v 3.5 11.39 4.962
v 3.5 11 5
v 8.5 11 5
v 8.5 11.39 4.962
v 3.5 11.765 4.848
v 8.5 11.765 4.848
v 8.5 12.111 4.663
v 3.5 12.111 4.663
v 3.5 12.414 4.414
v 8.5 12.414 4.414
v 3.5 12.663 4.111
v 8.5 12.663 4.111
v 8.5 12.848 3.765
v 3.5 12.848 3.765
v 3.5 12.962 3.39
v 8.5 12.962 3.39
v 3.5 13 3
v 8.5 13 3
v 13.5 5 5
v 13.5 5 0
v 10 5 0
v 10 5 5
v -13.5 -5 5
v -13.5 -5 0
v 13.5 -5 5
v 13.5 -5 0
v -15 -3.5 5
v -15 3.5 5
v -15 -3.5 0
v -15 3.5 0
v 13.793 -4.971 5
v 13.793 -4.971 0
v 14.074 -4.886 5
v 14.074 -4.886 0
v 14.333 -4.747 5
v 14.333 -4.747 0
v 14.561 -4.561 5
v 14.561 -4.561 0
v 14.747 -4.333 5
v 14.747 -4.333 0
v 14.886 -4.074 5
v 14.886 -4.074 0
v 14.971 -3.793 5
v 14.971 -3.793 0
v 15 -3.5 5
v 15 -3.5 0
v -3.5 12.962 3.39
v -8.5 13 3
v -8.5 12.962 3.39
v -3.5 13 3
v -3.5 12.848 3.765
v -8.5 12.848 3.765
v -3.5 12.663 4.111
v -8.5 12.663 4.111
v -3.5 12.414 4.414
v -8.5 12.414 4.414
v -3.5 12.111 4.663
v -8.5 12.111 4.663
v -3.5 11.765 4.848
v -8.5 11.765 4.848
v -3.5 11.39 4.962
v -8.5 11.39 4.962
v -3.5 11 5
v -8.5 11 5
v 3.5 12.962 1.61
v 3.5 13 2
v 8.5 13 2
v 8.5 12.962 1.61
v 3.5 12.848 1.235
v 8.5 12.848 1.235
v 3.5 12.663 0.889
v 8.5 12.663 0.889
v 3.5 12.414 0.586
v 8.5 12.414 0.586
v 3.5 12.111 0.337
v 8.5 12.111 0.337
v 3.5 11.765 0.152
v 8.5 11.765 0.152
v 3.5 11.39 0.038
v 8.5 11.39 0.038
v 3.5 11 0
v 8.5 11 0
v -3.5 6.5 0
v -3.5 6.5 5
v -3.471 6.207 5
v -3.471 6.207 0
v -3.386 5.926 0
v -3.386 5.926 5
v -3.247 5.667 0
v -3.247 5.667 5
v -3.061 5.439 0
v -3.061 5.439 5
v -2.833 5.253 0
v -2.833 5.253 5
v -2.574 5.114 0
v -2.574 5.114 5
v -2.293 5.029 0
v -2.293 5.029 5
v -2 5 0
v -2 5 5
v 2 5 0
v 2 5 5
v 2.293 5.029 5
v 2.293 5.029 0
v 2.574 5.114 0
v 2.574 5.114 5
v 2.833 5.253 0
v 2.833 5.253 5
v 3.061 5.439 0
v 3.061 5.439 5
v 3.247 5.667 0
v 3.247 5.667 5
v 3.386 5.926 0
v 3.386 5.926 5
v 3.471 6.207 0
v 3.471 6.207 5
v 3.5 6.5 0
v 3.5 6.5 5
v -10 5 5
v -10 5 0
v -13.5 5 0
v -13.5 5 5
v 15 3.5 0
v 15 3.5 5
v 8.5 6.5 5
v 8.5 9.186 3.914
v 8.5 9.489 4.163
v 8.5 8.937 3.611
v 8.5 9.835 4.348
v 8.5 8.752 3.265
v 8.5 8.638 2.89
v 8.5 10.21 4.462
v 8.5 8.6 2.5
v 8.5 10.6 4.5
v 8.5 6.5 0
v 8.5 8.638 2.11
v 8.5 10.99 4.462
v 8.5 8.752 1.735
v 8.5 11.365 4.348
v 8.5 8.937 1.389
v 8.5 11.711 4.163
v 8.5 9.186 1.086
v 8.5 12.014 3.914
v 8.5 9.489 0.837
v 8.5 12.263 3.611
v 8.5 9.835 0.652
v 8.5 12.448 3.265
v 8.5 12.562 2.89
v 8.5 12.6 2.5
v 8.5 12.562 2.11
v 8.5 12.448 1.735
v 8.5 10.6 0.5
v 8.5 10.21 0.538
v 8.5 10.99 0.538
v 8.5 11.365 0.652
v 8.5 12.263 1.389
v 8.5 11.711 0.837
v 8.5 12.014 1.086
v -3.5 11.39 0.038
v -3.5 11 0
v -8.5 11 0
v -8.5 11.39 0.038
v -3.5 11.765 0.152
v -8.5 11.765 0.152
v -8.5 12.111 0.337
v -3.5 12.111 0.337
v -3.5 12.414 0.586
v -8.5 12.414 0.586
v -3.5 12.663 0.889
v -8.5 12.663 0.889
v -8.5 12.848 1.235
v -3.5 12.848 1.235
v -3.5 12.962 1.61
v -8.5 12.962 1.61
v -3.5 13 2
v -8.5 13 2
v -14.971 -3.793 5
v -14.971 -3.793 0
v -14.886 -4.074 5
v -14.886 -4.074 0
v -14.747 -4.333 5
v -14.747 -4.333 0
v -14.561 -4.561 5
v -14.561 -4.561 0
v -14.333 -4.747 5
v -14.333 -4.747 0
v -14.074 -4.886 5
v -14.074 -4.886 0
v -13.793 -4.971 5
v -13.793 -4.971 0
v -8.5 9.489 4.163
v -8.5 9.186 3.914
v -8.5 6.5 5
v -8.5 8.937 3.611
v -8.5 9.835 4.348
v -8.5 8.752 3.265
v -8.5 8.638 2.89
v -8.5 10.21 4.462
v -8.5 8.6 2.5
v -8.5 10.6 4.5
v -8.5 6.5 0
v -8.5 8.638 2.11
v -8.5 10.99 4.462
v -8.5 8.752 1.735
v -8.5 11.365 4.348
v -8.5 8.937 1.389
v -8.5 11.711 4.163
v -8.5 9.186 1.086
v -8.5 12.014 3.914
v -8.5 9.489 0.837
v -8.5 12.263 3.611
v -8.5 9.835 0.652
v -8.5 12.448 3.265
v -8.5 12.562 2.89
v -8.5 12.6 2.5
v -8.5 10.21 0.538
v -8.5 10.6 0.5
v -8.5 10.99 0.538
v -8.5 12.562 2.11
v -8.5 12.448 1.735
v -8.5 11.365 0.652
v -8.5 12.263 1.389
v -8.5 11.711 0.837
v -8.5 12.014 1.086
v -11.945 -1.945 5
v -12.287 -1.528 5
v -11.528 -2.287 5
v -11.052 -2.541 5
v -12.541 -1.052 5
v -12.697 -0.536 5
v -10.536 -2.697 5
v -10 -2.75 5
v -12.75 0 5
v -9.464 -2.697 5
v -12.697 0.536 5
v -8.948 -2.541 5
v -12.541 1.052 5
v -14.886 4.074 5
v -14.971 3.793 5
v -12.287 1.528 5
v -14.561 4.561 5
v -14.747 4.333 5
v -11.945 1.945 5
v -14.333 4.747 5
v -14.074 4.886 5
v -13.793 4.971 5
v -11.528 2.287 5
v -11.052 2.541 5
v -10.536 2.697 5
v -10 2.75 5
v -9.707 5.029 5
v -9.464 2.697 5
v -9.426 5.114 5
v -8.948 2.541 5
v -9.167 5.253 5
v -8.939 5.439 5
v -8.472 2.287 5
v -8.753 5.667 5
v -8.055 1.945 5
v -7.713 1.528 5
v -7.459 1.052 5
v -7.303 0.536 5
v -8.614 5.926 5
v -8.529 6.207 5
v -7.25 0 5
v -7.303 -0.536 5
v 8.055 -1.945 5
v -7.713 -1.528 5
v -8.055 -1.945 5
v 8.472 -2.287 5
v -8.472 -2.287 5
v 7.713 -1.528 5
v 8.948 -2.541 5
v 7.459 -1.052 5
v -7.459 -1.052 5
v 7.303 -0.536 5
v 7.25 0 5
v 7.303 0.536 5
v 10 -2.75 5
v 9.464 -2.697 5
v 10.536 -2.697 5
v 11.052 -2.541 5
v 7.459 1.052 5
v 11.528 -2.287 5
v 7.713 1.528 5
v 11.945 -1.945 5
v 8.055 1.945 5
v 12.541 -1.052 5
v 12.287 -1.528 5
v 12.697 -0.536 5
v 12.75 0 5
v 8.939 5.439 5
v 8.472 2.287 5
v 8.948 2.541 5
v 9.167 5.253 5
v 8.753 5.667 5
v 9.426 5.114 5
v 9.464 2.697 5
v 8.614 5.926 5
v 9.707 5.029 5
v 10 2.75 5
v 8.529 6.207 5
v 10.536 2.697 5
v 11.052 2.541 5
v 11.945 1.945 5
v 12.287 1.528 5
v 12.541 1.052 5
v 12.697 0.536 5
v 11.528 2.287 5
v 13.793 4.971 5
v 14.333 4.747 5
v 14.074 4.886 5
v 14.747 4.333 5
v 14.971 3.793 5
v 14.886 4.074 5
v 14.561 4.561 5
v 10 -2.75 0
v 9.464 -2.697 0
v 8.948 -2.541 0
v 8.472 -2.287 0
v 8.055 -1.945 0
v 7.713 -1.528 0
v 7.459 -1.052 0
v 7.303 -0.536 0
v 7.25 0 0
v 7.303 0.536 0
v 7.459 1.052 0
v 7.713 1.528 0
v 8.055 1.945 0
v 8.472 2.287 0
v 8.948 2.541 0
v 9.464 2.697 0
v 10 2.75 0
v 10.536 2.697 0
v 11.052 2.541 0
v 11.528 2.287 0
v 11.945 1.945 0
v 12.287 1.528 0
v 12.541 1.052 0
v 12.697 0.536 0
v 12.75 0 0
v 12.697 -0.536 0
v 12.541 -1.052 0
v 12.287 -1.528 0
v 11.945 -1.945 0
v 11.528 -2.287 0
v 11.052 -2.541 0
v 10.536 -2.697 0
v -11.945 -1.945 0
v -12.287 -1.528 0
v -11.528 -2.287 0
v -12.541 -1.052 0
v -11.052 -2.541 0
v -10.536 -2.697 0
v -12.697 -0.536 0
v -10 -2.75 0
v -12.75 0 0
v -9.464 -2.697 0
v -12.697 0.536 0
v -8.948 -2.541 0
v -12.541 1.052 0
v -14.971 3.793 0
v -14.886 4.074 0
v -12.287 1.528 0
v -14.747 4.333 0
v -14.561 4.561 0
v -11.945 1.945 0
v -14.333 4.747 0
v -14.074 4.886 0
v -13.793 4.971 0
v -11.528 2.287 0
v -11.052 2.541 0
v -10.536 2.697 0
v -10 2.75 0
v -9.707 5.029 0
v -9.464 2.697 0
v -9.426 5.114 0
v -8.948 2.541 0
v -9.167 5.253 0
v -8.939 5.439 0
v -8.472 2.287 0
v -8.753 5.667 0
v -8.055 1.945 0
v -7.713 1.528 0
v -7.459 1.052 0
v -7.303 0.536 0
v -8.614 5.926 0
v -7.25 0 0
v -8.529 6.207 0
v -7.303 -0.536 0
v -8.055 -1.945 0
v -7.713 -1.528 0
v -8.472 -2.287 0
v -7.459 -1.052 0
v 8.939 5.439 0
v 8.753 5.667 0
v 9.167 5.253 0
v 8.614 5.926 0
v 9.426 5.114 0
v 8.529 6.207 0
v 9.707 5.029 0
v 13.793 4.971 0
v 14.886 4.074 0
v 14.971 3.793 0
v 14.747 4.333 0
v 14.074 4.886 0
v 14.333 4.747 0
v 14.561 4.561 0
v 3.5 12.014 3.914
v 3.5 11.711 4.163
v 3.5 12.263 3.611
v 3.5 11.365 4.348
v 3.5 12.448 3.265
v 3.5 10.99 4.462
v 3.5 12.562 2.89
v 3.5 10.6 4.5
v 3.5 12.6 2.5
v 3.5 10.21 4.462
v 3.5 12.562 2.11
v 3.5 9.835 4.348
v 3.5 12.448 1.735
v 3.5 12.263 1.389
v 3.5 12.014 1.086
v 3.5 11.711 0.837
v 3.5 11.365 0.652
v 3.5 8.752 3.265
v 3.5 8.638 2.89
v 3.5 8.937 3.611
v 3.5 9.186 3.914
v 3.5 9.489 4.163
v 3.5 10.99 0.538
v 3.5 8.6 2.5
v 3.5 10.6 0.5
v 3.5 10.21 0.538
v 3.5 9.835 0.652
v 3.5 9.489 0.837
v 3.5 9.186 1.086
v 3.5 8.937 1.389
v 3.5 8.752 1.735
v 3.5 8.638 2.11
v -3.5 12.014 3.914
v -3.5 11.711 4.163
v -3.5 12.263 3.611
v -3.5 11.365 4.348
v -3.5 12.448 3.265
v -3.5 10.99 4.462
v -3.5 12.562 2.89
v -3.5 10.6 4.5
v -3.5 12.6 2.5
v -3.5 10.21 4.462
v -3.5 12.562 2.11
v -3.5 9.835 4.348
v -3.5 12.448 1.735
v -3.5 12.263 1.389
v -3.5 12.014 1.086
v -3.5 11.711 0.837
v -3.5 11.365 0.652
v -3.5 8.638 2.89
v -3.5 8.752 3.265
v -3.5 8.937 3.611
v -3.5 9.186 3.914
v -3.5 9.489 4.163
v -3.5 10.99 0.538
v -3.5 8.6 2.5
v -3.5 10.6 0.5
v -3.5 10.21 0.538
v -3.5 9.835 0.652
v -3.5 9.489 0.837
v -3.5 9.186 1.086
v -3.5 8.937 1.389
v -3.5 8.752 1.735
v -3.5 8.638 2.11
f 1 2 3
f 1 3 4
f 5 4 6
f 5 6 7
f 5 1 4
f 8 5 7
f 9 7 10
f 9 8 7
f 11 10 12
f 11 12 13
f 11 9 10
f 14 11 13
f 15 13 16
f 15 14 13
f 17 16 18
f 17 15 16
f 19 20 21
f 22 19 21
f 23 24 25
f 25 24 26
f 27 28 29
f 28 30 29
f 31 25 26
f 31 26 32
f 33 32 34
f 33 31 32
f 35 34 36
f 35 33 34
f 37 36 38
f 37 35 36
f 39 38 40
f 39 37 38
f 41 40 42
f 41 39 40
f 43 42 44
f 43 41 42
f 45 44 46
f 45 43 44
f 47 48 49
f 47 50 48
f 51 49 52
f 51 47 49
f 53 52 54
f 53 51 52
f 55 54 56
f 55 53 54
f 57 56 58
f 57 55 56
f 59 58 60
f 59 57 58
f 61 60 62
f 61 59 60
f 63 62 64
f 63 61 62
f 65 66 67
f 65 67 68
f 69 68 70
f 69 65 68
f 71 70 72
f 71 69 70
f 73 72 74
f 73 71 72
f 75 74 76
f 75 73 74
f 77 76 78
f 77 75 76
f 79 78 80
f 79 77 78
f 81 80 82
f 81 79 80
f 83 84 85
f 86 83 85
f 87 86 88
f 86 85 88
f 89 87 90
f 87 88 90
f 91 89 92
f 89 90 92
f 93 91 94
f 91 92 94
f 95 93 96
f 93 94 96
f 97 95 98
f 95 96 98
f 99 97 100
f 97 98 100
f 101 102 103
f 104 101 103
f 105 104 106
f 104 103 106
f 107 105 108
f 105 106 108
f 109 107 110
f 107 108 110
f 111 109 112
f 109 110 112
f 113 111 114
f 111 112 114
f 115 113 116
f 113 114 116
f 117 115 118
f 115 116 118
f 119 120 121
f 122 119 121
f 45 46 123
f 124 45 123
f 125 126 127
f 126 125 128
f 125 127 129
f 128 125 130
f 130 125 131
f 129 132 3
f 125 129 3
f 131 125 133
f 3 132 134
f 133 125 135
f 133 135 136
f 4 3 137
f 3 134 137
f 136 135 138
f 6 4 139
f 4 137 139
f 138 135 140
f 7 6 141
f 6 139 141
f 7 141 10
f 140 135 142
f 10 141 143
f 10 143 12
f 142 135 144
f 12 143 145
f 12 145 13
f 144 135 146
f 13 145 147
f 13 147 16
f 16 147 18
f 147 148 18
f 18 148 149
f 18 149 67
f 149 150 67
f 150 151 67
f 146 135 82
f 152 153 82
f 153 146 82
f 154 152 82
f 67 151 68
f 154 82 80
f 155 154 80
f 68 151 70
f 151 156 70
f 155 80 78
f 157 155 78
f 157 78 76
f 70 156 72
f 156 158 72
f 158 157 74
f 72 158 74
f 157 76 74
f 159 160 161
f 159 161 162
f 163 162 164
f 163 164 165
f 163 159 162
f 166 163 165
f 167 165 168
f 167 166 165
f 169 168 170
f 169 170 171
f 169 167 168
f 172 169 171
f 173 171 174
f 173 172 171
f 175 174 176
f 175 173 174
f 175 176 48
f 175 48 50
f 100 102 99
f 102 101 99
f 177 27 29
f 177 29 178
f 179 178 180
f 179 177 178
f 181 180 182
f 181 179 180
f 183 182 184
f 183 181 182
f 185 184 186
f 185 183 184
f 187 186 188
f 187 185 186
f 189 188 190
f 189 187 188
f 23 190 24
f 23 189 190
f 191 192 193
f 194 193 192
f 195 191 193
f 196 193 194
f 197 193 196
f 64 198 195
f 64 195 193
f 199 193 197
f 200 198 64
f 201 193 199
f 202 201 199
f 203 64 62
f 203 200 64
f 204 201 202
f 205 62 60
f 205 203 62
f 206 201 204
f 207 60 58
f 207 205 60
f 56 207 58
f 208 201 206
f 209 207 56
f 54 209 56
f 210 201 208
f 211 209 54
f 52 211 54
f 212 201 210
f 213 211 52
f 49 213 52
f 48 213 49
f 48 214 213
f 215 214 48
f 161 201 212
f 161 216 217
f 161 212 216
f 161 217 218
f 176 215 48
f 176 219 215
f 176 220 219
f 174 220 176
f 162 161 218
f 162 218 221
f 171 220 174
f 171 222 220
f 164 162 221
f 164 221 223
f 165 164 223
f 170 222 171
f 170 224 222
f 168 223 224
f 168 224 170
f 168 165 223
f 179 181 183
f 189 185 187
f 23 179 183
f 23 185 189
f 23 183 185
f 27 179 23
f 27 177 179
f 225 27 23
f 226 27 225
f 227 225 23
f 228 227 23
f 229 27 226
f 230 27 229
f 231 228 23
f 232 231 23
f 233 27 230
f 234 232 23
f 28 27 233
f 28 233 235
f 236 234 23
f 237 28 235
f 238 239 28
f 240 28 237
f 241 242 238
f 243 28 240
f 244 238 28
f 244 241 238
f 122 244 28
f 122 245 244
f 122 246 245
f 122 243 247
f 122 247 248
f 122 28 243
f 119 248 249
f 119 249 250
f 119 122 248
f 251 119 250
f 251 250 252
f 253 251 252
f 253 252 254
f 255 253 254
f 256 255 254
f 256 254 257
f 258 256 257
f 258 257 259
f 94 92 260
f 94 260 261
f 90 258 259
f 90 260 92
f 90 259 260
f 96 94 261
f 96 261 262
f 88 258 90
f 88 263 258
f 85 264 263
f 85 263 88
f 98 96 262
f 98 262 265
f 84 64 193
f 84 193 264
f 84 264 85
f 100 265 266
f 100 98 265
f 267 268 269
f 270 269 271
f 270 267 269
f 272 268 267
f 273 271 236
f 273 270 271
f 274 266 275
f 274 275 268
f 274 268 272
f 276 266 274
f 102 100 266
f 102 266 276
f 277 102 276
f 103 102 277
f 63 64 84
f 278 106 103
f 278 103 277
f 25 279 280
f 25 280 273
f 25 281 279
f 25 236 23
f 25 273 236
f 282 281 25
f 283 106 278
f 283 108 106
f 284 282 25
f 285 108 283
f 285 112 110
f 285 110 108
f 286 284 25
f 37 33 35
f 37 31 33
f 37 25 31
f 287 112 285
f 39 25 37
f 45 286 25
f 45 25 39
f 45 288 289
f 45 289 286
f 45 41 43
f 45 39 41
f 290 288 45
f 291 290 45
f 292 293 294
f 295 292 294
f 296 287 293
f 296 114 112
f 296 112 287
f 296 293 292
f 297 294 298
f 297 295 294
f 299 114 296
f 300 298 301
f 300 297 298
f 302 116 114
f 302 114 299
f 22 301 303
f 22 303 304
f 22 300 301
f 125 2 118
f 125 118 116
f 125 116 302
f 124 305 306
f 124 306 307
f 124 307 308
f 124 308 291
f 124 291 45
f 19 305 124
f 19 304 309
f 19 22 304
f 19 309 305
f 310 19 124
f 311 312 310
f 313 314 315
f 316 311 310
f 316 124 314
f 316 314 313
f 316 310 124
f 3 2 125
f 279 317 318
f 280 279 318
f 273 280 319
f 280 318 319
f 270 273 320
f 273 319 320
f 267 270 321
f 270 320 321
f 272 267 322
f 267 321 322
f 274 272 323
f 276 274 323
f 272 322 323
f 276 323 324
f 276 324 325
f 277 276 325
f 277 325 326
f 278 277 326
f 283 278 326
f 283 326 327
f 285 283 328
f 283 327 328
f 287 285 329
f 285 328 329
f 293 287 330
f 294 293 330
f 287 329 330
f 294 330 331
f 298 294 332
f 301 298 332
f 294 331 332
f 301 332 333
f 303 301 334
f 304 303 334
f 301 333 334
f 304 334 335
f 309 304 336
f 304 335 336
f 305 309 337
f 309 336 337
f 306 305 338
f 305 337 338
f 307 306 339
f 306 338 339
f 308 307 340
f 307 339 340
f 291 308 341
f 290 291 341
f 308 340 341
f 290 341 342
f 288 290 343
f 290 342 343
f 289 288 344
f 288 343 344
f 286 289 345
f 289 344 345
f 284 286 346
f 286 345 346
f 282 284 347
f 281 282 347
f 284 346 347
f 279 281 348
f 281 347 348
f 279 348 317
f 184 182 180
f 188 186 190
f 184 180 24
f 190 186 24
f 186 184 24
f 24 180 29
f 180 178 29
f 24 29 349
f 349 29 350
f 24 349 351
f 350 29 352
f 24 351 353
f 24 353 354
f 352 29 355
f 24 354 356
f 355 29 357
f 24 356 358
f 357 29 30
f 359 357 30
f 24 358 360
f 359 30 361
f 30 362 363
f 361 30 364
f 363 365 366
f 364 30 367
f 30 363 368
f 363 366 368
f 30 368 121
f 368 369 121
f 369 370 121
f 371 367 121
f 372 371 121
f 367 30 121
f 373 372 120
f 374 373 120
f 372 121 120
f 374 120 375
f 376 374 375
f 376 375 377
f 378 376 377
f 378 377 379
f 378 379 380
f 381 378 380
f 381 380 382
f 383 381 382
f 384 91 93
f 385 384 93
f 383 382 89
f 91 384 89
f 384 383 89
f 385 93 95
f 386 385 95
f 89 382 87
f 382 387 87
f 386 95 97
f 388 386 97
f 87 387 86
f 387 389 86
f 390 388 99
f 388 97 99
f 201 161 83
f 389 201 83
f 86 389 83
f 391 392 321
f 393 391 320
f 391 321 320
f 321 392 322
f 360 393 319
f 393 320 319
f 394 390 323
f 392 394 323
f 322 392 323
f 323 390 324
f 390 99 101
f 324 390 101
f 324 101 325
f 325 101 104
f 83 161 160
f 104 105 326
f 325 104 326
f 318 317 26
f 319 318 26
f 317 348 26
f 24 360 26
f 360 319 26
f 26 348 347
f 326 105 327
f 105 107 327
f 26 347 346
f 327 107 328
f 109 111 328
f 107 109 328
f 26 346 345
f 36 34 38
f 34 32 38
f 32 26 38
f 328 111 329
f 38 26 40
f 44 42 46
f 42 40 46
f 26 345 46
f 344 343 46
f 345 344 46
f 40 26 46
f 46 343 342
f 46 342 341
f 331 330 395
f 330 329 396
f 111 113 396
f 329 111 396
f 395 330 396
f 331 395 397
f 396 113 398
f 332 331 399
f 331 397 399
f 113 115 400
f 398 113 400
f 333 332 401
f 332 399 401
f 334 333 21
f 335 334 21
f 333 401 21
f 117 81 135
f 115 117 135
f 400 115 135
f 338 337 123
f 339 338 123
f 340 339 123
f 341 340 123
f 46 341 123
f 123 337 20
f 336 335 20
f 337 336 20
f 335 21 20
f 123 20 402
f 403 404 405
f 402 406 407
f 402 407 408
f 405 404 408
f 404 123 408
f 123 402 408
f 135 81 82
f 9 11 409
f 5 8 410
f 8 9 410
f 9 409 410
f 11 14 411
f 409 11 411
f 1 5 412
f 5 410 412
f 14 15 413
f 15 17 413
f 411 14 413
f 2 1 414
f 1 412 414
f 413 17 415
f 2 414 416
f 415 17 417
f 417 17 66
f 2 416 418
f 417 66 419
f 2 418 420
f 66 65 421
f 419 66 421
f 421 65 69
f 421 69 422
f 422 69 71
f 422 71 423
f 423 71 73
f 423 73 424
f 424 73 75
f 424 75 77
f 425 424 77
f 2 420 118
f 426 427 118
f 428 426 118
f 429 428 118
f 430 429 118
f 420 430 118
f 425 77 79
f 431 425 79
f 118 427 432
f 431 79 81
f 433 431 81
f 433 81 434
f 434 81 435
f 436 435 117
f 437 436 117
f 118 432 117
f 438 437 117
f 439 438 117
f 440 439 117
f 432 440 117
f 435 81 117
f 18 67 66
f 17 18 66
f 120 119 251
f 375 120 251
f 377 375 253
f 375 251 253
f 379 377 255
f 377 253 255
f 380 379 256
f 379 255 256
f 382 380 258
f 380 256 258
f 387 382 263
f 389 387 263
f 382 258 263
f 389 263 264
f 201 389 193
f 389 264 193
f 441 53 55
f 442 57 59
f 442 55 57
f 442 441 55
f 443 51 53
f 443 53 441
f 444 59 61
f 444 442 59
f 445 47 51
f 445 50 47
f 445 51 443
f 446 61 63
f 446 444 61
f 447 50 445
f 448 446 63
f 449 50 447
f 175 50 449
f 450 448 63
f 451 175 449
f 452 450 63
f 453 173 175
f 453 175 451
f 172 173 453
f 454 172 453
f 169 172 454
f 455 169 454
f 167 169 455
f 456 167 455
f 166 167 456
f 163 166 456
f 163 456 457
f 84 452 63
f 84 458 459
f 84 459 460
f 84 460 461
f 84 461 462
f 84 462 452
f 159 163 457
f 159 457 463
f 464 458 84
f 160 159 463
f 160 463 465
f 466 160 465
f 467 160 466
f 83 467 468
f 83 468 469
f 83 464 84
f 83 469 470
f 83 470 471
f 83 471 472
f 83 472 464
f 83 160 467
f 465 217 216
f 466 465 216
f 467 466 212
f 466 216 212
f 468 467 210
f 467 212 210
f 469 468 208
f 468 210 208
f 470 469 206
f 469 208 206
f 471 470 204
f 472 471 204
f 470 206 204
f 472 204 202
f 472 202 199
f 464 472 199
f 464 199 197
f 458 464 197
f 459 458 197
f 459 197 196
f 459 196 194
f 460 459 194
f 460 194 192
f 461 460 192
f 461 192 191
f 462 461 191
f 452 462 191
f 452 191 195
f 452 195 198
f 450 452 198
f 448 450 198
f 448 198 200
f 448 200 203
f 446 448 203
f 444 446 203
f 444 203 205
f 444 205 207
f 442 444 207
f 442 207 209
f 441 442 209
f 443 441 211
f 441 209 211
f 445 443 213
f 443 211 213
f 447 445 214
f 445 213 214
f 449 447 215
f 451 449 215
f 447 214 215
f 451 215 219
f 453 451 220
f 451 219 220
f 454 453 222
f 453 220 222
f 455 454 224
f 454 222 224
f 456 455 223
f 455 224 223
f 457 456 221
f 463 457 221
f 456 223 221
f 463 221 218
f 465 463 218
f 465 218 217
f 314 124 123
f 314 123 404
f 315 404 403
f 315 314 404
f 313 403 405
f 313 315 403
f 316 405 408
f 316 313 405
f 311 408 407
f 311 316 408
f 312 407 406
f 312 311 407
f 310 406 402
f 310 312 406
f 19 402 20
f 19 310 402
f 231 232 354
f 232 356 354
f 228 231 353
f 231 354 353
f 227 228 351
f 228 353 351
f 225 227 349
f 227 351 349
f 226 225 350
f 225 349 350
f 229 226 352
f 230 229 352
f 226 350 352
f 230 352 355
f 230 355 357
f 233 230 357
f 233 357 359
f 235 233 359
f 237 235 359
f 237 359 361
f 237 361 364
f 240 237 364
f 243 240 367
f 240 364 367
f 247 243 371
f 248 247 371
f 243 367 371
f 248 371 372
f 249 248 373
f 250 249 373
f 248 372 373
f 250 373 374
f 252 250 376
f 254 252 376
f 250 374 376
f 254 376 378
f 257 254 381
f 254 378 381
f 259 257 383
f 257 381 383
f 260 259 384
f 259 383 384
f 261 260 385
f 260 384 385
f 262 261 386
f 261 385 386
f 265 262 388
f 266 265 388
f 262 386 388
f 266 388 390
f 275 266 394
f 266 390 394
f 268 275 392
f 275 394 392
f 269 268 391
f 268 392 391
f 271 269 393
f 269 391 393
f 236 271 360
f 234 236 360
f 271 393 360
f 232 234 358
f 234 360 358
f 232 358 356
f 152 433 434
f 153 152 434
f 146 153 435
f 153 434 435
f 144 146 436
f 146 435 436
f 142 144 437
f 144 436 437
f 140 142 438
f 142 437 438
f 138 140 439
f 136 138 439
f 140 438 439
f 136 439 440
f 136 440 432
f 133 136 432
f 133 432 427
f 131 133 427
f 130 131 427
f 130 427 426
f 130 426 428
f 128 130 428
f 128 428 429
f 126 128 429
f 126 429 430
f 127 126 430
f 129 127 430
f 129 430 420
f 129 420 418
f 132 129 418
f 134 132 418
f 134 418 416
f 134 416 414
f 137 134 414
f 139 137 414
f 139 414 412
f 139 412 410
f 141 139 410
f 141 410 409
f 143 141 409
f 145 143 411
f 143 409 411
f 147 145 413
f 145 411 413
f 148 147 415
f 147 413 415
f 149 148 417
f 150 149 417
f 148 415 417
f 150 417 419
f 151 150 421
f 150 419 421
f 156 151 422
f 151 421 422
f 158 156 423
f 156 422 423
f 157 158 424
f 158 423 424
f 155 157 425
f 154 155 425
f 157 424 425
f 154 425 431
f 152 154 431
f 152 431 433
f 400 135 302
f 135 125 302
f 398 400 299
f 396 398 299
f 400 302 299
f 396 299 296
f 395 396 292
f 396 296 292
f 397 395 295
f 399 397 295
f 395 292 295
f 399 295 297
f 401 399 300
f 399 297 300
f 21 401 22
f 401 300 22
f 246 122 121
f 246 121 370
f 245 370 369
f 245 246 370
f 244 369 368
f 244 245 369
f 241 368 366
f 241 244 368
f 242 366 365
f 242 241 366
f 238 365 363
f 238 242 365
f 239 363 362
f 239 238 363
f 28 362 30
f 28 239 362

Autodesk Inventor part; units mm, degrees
ref_plane "YZ Plane" through (0, 0, 0) normal (1, 0, 0) x (0, 1, 0)
ref_plane "XZ Plane" through (0, 0, 0) normal (0, 1, 0) x (-1, 0, 0)
ref_plane "XY Plane" through (0, 0, 0) normal (0, 0, 1) x (1, 0, 0)
sketch "Sketch1" plane through (0, 0, 0) normal (0, 0, 1) x (1, 0, 0)
  line L0 (-15, -5) -> (15, -5)
  line L1 (15, -5) -> (15, 5)
  line L2 (15, 5) -> (-15, 5)
  line L3 (-15, 5) -> (-15, -5)
  line L4 (-15, -5) -> (15, 5) construction
  line L5 (15, -5) -> (-15, 5) construction
  line L6 (-8.5, 5) -> (-8.5, 13)
  line L7 (-8.5, 13) -> (-3.5, 13)
  line L8 (-3.5, 13) -> (-3.5, 5)
  line L9 (0, 0) -> (0, 10.7683) construction
  line L10 (8.5, 5) -> (8.5, 13)
  line L11 (8.5, 13) -> (3.5, 13)
  line L12 (3.5, 13) -> (3.5, 5)
  point P0 (8.5, 5)
  point P1 (3.5, 5)
  dimension "d0" = 10
  dimension "d1" = 30
  dimension "d2" = 5
  dimension "d3" = 8
  dimension "d4" = 7
extrude "Extrusion1" add sketch "Sketch1" along normal blind 5
sketch "Sketch2" plane through (8.5, 5, 0) normal (1, 0, 0) x (0, 0, -1)
  line L0 (0, 0) -> (0, 8) projected
  line L1 (-5, 0) -> (-5, 8) projected
  line L2 (0, 8) -> (-5, 8) projected
  line L3 (0, 0) -> (-5, 0) projected
  point P0 (0, -5)
  point P1 (-2.5, 5.6)
  dimension "d14" = 2.5
  dimension "d15" = 5
  dimension "d16" = 2.4
  dimension "d17" = 8
hole "Hole1" at (8.5, 10.6, 2.5) direction (-1, 0, 0) diameter 4 end through all
fillet "Fillet1" radius 2 4 edges at (6, 13, 0) (6, 13, 5) (-6, 13, 0) (-6, 13, 5)
fillet "Fillet2" radius 1.5 8 edges at (-3.5, 5, 2.5) (3.5, 5, 2.5) (-8.5, 5, 2.5) (8.5, 5, 2.5) (15, 5, 2.5) (15, -5, 2.5) (-15, -5, 2.5) (-15, 5, 2.5)
sketch "Sketch3" plane through (0, 0, 5) normal (0, 0, 1) x (1, 0, 0)
  point P0 (0, 0)
  point P1 (-10, 0)
  point P2 (10, 0)
  dimension "d27" = 10
  dimension "d30" = 360
hole "Hole2" at (-10, 0, 5) at (10, 0, 5) direction (0, 0, -1) diameter 5.5 end through all clearance for "Countersunk Flat Head Screw ISO 2009/7046" size "M5" standard "ISO"
equation "\"d14\" = 0.5 * d15"
properties part number "axe_camera"
